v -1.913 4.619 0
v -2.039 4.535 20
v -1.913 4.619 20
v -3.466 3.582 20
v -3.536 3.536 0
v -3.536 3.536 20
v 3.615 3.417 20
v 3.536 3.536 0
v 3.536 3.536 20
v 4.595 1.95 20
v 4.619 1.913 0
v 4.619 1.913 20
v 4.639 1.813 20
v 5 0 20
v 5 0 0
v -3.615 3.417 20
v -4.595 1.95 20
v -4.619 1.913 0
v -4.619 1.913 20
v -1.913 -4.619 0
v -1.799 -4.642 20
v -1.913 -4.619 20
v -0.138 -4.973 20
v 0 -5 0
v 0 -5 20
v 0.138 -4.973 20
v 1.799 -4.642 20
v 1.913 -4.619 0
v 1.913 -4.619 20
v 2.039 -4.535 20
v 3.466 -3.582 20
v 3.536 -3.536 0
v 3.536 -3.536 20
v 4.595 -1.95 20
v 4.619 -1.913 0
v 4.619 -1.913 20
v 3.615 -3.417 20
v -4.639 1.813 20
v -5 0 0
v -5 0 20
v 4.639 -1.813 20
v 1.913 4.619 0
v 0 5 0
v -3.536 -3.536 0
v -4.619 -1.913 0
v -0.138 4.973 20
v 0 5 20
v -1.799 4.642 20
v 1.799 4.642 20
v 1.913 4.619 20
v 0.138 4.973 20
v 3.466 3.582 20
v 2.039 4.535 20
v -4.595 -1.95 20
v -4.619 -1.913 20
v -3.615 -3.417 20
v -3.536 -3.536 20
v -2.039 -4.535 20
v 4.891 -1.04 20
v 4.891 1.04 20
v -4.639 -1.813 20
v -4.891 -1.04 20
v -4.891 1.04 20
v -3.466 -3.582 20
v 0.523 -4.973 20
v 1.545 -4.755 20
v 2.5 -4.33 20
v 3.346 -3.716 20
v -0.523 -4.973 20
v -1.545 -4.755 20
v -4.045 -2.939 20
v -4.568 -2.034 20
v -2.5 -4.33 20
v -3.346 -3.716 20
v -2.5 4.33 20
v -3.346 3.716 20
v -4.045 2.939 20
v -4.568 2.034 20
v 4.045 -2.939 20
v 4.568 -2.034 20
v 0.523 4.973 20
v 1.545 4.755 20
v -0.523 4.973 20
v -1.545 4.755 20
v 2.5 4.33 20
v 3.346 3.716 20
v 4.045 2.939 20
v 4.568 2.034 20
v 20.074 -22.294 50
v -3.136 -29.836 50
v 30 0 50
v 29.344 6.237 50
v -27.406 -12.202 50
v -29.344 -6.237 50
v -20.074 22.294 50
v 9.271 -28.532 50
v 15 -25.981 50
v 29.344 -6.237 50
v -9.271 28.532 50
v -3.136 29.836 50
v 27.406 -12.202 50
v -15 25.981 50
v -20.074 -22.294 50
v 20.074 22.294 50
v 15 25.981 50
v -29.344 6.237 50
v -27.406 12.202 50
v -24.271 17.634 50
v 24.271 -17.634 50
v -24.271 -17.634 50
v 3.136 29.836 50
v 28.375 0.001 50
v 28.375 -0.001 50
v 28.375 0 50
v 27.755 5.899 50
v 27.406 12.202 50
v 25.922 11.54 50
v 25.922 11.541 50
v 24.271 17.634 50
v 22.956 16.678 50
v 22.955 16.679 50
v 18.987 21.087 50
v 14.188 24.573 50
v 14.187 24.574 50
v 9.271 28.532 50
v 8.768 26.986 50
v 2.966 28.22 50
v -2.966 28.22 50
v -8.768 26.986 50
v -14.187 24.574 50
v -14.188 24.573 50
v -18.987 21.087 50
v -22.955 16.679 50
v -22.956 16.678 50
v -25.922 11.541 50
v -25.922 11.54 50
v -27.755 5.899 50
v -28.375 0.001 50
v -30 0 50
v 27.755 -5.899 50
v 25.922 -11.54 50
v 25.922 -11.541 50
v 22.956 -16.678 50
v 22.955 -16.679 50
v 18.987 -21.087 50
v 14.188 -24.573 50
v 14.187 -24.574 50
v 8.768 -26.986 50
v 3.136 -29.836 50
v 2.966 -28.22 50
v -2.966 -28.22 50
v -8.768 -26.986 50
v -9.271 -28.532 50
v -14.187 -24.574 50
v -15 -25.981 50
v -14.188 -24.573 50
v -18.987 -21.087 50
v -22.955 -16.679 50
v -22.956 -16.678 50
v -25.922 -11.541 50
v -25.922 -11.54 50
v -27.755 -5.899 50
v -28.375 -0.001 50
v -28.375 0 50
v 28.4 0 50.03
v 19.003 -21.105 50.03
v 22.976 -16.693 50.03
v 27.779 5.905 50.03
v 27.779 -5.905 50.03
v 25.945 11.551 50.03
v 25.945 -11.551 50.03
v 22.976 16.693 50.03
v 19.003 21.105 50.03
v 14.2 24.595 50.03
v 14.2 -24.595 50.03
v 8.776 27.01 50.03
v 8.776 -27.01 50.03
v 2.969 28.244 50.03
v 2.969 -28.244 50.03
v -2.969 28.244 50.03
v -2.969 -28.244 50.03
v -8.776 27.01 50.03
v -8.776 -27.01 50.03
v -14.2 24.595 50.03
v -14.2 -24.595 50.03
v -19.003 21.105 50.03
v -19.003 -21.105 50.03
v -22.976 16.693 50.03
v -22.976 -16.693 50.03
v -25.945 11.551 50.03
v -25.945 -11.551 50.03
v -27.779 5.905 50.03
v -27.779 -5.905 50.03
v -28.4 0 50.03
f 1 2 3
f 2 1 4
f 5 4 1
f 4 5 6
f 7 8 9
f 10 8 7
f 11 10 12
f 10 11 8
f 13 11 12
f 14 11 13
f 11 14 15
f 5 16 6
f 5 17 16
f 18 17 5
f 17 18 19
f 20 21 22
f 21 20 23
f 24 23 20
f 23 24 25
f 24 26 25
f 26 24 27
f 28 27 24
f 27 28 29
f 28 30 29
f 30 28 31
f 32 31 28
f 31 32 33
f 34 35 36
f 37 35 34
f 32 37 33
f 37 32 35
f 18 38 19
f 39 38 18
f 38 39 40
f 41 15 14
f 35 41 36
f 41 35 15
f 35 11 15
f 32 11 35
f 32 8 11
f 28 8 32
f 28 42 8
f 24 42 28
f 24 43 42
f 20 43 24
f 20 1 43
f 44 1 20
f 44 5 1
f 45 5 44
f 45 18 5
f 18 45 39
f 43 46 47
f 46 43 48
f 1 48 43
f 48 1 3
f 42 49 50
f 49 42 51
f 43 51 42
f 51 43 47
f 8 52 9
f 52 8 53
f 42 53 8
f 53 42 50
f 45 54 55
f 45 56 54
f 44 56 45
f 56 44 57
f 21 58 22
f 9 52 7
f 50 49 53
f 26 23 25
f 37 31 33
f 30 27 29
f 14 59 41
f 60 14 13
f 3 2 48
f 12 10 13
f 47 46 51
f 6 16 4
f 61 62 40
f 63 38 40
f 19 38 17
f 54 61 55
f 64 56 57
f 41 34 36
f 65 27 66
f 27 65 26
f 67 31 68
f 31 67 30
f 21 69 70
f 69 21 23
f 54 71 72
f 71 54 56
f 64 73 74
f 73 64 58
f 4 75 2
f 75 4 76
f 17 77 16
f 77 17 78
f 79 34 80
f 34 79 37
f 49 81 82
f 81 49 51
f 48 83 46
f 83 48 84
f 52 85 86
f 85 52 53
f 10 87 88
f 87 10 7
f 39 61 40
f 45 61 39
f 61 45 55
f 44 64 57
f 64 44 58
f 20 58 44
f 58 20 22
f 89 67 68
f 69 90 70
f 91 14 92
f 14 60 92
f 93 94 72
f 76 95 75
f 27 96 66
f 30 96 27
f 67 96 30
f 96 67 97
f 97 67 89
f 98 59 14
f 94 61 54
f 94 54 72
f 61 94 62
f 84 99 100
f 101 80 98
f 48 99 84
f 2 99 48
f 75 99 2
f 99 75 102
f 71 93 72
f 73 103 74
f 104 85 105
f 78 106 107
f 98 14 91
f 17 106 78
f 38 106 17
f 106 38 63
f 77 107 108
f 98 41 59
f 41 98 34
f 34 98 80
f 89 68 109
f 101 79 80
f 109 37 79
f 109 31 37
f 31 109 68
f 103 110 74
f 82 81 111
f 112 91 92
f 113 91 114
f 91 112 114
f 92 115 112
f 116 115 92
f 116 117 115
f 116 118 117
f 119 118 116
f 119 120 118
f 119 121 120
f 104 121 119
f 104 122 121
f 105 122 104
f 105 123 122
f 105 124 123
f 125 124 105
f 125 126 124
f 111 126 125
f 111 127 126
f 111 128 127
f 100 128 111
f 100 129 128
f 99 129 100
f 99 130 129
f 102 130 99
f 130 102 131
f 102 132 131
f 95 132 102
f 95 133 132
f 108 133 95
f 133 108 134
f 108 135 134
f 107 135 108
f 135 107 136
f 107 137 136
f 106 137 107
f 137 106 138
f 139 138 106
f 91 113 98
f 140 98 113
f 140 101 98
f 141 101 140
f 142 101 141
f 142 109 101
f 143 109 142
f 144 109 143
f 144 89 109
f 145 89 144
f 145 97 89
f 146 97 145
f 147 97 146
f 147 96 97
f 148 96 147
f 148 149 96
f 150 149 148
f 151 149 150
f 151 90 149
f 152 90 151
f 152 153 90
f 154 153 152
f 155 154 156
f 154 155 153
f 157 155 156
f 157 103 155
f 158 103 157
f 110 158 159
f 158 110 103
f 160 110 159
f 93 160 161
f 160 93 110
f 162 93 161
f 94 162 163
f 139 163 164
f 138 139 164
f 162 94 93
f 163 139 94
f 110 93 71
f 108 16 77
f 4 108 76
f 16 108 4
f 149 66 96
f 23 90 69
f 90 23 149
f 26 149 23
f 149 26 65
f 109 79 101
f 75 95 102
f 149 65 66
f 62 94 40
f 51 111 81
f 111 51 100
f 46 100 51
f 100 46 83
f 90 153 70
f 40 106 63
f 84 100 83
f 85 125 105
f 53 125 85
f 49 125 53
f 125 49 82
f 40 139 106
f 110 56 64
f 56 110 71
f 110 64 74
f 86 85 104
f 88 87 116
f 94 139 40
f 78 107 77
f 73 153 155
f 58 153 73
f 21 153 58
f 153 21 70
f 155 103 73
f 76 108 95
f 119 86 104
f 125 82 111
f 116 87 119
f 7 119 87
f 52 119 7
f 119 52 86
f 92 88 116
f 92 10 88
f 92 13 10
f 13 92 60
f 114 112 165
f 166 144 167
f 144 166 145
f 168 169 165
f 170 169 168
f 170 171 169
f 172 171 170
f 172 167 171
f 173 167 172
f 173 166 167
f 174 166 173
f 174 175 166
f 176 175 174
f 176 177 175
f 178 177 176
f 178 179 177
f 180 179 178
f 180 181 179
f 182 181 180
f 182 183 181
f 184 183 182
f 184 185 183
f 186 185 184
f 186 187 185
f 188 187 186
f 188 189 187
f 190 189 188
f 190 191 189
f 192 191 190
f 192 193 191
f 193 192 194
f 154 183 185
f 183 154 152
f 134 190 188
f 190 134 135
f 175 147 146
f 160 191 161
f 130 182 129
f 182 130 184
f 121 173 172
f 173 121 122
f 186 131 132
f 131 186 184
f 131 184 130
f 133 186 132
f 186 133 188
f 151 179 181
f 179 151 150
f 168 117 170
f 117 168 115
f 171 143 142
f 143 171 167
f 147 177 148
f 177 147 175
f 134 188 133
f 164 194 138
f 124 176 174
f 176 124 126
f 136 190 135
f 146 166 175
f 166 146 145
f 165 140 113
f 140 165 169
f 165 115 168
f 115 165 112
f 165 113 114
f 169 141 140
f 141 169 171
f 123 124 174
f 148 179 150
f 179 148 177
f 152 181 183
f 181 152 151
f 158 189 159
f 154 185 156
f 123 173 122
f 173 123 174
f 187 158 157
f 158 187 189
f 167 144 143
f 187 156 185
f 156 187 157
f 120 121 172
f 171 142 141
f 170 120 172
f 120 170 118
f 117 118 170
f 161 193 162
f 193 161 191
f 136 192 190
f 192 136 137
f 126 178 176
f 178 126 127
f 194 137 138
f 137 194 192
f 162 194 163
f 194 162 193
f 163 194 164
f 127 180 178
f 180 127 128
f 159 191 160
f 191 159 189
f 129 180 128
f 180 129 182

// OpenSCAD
// Lab Funnel Design
// Dimensions measured in mm, printed upright (XY plane at z=0)

// Spout dimensions
spout_od = 10;          // Outer diameter of spout
spout_height = 20;      // Height of spout section
spout_thickness = 1.6;  // Wall thickness
spout_id = spout_od - 2 * spout_thickness; // Inner diameter of spout

// Funnel cone dimensions
funnel_base_diam = spout_od; // Diameter at base of cone (z=20)
funnel_top_diam = 60;        // Diameter at rim of cone (z=50)
funnel_height = 30;         // Height of cone section (50 - 20)
funnel_total_height = spout_height + funnel_height; // Total height

// Wall thickness (constant)
wall_thickness = 1.6;

// Calculate inner diameters
funnel_base_id = funnel_base_diam - 2 * wall_thickness;
funnel_top_id = funnel_top_diam - 2 * wall_thickness;

// Spout inner radius
spout_r = spout_id / 2;

// Funnel base inner radius
funnel_base_r = funnel_base_id / 2;

// Funnel top inner radius
funnel_top_r = funnel_top_id / 2;

// Spout outer radius
spout_r_out = spout_od / 2;

// Funnel base outer radius
funnel_base_r_out = funnel_base_diam / 2;

// Funnel top outer radius
funnel_top_r_out = funnel_top_diam / 2;

// Create the solid funnel
module funnel() {
    // Spout section (cylinder)
    // Outer cylinder
    cylinder(h = spout_height, r = spout_r_out, center = false);
    
    // Inner hole (difference)
    translate([0, 0, 0.01]) // Offset slightly to avoid coplanar faces
    cylinder(h = spout_height + 0.02, r = spout_r, center = false);
    
    // Funnel cone section
    // Outer cone (tapered cylinder)
    // We use a cylinder with different radii at top and bottom
    // Base at z=20, Top at z=50
    // Outer cone
    translate([0, 0, spout_height])
    cylinder(h = funnel_height, r1 = funnel_base_r_out, r2 = funnel_top_r_out, center = false);
    
    // Inner cone (difference)
    translate([0, 0, spout_height + 0.01]) // Offset slightly
    cylinder(h = funnel_height + 0.02, r1 = funnel_base_r, r2 = funnel_top_r, center = false);
}

// Center the funnel on the XY plane
translate([0, 0, 0])
funnel();
